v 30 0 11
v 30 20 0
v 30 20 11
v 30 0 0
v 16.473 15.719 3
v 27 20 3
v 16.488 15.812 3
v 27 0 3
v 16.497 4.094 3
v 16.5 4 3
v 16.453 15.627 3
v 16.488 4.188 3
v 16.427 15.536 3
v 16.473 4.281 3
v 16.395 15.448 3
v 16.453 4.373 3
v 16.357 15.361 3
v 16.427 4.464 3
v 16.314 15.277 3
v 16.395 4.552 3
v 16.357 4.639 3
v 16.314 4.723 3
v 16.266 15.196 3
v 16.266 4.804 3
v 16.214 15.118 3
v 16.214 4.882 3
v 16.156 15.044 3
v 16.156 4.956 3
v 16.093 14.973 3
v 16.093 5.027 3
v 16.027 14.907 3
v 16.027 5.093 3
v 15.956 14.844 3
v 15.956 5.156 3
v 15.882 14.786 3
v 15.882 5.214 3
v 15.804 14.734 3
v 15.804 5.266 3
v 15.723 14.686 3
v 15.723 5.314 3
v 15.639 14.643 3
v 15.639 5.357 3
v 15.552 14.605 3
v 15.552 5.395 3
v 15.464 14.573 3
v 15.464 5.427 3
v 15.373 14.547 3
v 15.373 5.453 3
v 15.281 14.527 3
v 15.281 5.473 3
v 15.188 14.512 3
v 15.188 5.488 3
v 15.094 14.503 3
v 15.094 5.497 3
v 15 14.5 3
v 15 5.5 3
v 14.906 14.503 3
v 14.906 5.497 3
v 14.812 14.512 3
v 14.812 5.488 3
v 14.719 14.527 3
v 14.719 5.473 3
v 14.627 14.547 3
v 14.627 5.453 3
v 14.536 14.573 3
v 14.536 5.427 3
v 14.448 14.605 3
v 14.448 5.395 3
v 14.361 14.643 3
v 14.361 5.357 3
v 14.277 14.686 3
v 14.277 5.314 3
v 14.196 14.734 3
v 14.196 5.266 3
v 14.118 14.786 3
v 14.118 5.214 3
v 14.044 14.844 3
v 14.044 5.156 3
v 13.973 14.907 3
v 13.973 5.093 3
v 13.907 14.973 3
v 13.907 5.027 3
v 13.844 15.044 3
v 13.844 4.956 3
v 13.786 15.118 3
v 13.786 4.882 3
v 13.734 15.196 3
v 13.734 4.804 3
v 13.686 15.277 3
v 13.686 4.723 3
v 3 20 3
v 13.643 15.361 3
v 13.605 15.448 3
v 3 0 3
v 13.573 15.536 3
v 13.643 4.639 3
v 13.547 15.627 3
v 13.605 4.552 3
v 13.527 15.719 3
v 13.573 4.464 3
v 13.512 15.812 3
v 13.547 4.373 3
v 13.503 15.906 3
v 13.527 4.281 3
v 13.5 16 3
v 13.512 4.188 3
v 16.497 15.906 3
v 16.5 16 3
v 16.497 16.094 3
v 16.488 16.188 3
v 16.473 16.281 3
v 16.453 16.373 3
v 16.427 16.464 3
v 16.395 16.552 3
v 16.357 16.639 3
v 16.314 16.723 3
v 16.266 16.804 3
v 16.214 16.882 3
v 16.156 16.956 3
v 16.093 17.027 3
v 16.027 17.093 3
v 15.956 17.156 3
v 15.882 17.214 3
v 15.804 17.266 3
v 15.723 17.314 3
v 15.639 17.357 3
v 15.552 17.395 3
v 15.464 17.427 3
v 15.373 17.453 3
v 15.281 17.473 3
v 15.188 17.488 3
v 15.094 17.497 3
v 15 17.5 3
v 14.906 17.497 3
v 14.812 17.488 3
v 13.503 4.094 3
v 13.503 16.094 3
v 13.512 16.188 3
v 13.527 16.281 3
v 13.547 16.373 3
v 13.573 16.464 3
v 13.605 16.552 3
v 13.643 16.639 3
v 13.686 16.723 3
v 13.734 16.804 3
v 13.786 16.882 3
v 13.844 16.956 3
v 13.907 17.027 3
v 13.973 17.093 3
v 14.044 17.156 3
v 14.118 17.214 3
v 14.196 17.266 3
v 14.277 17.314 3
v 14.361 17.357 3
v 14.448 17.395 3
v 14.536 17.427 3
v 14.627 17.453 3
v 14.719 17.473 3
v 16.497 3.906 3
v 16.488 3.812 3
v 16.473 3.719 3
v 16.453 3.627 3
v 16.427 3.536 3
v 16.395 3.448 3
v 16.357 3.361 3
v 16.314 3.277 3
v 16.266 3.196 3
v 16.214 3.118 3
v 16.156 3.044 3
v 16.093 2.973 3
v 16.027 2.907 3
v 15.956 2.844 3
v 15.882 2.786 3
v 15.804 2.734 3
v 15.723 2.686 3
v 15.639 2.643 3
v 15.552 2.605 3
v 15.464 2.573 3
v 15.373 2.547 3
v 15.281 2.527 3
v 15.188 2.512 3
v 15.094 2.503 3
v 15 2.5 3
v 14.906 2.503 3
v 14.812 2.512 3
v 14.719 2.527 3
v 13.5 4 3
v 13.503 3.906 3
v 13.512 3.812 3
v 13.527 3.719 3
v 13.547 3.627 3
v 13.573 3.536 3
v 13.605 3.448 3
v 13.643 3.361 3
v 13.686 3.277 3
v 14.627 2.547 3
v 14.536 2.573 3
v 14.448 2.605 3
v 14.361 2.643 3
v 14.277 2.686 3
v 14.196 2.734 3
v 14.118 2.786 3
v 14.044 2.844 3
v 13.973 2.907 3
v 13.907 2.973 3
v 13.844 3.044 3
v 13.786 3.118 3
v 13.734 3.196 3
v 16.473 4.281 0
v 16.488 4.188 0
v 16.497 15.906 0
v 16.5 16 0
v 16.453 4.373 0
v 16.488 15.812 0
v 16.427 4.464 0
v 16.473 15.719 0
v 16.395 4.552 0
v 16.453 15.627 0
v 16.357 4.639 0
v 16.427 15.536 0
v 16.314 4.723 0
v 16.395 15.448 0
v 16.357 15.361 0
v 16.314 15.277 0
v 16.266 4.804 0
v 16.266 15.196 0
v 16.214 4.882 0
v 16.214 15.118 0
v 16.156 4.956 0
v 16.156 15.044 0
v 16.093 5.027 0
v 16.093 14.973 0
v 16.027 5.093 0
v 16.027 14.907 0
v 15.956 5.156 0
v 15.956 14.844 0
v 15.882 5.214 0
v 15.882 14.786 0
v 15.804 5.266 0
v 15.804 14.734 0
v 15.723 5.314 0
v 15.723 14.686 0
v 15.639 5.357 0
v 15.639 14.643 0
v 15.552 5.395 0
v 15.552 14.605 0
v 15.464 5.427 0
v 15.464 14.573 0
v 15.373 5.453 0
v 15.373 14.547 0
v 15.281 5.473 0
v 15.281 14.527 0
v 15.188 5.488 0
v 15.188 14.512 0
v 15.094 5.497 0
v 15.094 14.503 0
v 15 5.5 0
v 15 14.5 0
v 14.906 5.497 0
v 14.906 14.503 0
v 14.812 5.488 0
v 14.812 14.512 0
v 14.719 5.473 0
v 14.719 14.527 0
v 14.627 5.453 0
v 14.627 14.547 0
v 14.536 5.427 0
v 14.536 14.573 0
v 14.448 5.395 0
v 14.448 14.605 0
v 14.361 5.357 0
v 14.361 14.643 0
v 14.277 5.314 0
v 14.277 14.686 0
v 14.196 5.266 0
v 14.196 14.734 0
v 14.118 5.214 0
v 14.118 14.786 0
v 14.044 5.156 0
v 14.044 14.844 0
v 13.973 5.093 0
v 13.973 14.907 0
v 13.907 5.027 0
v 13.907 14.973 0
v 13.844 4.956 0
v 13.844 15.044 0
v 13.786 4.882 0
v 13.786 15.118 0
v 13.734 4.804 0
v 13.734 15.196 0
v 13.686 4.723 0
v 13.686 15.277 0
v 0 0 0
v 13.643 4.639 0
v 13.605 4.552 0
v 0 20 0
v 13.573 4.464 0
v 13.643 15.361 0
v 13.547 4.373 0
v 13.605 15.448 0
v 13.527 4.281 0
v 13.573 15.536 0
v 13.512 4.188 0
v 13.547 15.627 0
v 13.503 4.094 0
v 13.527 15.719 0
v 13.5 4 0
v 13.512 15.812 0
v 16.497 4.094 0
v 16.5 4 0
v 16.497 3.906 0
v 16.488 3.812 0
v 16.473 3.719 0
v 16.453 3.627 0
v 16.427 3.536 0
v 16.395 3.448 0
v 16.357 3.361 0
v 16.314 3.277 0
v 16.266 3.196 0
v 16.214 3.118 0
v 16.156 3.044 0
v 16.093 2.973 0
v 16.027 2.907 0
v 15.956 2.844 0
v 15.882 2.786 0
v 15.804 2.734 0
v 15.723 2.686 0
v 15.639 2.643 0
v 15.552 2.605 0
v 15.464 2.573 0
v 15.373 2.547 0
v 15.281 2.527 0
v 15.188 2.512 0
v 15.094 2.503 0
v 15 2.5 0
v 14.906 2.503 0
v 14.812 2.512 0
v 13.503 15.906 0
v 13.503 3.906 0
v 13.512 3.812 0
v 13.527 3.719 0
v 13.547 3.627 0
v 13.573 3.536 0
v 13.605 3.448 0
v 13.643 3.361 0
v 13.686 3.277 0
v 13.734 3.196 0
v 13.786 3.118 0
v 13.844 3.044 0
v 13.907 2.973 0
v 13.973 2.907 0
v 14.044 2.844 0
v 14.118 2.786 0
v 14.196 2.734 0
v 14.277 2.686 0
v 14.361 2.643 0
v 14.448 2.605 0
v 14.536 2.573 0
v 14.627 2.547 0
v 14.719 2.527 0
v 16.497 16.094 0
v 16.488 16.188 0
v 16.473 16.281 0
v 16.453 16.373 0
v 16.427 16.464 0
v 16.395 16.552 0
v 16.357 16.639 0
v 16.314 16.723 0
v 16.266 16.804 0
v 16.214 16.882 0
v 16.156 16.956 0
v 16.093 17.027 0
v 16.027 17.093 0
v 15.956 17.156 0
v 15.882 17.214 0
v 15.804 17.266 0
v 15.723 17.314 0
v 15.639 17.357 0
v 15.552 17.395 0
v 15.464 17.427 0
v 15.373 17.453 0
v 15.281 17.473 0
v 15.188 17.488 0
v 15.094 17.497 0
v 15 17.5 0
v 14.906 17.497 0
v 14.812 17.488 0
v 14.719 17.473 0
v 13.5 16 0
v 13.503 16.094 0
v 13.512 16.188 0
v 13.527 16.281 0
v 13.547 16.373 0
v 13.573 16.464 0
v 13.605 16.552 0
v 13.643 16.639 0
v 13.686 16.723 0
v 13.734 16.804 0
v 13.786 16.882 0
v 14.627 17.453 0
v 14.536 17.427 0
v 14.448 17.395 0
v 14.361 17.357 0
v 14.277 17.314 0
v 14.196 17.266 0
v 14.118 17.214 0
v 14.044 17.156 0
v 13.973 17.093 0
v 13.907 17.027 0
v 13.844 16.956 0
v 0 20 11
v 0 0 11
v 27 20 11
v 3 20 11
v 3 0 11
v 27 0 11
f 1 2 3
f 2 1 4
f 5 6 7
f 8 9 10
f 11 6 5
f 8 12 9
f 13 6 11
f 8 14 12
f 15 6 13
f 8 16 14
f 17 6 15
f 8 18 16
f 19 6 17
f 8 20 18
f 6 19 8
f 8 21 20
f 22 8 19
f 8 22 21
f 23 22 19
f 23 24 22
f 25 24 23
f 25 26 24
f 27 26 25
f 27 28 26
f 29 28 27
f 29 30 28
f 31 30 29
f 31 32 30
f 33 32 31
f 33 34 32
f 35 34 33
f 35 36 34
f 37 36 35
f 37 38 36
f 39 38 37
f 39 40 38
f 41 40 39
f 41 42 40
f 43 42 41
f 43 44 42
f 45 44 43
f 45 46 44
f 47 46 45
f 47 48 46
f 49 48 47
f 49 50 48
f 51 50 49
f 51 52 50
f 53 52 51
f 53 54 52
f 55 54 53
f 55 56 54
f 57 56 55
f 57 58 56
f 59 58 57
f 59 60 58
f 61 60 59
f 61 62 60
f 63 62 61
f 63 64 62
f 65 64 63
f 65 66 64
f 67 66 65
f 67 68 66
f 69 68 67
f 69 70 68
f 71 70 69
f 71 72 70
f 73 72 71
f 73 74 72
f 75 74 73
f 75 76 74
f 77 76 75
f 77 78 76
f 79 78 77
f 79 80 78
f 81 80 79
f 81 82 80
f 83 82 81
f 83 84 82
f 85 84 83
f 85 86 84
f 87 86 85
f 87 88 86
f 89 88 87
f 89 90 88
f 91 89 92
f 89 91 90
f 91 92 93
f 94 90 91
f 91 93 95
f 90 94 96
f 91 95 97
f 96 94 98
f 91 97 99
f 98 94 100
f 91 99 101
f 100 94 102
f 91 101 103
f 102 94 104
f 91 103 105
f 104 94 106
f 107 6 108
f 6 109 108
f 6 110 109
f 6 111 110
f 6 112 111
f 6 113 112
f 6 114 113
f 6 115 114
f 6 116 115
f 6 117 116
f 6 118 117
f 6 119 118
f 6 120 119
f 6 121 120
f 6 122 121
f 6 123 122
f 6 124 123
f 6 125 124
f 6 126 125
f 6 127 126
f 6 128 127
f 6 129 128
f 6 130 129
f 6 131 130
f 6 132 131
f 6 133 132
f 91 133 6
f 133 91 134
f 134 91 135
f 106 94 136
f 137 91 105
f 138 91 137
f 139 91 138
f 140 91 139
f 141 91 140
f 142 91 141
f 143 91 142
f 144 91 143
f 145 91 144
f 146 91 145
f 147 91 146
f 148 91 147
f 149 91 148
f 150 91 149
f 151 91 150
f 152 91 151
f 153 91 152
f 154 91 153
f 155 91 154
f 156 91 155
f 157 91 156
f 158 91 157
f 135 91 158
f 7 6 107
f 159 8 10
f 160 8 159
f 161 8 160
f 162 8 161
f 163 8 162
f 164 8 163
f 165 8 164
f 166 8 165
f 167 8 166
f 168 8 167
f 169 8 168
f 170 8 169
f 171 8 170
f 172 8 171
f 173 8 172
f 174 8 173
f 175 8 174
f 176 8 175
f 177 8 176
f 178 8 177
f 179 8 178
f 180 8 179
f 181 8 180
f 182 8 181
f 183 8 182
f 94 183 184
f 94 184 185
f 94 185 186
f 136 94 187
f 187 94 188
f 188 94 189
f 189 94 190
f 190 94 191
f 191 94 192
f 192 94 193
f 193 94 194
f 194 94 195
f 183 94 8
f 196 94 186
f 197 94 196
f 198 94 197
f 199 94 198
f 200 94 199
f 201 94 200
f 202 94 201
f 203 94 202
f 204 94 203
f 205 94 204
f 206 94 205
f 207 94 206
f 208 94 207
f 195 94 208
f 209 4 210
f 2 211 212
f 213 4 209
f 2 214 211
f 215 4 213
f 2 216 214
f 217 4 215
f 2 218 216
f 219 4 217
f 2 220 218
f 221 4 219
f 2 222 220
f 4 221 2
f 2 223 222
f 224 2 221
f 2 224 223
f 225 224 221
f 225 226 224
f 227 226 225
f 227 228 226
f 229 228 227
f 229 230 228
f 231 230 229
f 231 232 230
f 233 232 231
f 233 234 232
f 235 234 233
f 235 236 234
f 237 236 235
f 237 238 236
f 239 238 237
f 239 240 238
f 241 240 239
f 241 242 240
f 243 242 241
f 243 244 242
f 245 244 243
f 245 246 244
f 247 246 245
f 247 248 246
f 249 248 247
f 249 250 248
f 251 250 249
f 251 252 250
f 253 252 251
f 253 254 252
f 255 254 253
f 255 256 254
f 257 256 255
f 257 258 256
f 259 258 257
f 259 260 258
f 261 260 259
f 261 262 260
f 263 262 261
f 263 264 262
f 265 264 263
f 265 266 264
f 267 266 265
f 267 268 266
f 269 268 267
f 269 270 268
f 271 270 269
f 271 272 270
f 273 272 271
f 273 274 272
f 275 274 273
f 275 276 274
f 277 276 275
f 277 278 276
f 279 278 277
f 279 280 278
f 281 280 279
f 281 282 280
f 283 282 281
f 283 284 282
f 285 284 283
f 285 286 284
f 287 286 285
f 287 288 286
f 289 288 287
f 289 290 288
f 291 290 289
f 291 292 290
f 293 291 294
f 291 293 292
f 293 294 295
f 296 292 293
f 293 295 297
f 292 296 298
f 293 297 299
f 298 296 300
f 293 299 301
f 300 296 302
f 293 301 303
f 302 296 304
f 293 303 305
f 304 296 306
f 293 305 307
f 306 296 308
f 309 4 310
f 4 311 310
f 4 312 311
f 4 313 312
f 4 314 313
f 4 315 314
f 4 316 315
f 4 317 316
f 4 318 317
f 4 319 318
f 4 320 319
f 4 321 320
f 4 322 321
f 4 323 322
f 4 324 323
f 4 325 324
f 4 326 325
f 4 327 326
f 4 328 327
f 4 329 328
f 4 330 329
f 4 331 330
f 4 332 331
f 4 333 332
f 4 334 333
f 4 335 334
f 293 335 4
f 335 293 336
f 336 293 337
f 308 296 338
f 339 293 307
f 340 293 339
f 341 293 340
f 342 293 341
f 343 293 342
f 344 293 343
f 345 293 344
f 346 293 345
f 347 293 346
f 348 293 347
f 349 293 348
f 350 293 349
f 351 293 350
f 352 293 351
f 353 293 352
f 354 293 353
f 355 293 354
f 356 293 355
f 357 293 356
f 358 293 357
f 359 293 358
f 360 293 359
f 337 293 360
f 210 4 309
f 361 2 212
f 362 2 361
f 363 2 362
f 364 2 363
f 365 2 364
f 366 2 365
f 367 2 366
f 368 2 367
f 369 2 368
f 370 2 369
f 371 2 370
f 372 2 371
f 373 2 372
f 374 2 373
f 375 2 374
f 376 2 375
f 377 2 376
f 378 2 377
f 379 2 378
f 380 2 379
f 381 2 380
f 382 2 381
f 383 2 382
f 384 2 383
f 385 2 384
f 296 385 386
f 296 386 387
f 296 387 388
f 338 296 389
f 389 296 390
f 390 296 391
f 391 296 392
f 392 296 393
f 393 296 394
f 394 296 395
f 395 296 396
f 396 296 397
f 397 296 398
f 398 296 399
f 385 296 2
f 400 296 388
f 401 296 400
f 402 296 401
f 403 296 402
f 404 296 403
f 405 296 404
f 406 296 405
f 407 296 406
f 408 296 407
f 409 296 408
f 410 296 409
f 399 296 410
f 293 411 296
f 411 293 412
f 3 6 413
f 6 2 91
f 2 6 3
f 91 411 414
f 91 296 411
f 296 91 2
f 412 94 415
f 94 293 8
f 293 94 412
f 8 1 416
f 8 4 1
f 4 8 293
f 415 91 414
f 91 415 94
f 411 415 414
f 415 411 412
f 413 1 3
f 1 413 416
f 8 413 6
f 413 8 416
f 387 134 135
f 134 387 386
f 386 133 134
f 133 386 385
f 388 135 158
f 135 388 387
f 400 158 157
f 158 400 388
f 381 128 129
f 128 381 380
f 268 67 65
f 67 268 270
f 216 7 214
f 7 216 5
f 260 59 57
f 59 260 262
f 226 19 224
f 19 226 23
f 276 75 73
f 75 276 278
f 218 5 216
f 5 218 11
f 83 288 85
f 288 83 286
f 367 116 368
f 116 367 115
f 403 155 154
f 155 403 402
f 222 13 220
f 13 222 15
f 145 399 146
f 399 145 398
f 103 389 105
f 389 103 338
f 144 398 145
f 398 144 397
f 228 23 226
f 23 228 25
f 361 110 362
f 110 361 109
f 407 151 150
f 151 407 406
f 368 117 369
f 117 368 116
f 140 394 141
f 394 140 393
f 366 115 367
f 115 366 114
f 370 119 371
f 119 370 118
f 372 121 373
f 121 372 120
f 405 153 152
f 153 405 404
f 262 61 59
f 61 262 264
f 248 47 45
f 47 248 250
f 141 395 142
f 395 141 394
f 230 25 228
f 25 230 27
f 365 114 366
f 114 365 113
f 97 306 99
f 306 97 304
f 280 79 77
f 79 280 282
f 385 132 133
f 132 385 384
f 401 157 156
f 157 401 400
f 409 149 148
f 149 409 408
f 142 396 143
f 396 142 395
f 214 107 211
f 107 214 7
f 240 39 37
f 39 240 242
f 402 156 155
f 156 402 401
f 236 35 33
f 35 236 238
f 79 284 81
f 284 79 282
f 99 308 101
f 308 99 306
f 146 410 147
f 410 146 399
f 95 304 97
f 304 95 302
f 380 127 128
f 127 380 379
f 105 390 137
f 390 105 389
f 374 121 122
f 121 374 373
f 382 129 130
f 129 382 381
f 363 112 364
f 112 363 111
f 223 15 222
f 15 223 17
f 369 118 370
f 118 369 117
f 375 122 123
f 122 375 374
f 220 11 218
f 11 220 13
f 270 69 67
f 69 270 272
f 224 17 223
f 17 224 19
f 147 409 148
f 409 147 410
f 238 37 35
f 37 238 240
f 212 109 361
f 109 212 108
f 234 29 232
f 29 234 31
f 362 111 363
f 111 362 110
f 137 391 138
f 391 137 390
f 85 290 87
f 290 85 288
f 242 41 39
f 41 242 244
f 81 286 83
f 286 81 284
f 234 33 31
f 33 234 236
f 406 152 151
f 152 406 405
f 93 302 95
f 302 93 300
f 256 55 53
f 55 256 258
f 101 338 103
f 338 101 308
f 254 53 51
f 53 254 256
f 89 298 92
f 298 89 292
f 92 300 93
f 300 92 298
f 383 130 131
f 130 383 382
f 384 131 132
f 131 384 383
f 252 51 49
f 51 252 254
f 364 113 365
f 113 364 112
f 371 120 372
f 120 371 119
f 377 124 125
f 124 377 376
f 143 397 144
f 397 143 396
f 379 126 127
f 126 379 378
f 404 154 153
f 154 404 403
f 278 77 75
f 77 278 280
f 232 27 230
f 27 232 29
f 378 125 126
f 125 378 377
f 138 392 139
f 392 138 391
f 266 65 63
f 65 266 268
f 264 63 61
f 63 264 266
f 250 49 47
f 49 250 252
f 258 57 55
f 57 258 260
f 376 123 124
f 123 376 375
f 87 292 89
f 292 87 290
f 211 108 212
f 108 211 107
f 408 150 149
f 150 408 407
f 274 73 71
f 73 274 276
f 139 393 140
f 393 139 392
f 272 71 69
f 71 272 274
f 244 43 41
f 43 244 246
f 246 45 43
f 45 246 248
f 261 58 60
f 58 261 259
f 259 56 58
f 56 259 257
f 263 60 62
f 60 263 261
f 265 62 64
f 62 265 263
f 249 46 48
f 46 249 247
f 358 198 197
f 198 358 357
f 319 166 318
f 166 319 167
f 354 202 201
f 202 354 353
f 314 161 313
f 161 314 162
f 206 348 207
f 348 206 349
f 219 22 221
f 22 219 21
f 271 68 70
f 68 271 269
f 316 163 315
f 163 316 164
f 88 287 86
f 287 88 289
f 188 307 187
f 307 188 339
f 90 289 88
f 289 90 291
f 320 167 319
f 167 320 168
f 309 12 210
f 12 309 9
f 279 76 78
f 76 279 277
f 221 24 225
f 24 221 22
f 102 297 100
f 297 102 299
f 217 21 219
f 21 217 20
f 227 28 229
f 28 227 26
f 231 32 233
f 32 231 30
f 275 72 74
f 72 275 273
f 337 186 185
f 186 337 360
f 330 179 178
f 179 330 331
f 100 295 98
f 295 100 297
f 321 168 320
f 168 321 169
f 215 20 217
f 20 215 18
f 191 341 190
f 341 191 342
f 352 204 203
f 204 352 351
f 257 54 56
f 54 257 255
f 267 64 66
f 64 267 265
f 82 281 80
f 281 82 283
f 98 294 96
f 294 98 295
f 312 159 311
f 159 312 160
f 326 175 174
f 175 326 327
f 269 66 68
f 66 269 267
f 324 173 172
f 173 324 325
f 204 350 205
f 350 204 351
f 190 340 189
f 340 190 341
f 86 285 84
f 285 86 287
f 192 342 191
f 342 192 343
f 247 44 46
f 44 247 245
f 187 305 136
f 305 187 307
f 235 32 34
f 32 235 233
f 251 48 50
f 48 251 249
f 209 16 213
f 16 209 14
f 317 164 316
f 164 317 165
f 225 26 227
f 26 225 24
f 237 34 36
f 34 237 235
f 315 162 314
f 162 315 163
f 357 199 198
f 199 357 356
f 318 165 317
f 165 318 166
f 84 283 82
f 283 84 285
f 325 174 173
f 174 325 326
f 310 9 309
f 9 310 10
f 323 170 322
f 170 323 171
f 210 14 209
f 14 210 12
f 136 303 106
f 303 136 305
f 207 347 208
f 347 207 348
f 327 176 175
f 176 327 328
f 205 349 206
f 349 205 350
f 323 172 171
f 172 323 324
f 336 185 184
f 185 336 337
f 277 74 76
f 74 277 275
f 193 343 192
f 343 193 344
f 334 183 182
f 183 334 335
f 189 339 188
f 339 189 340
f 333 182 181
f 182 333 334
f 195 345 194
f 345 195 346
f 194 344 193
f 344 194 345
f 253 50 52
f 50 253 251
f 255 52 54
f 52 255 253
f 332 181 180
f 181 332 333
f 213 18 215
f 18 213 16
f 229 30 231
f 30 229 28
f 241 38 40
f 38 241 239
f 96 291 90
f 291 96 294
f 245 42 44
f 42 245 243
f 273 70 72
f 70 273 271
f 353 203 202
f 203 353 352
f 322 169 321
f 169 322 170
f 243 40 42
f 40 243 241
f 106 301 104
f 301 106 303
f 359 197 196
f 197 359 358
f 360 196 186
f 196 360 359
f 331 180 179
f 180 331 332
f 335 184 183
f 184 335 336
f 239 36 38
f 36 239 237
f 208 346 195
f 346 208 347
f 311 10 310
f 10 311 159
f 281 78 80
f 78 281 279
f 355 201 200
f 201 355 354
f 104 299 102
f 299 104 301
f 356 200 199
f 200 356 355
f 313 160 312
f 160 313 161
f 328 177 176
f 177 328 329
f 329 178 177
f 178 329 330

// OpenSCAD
difference(){
	union(){ 

        translate([0,0,0]){
           cube([30,20,3], center=false);
        }                
        translate([0,0,0]){
           cube([3,20,11], center=false);
        }                
        translate([27,0,0]){
           cube([3,20,11], center=false);
        }                
	}
	union() {
        translate([15,16,0]){
            rotate([0,0,90]){
                cylinder(h=200, r=1.5, $fn=100, center=true);
            }   
        }
        translate([15,4,0]){
            rotate([0,0,90]){
                cylinder(h=200, r=1.5, $fn=100, center=true);
            }   
        }
	}
}
